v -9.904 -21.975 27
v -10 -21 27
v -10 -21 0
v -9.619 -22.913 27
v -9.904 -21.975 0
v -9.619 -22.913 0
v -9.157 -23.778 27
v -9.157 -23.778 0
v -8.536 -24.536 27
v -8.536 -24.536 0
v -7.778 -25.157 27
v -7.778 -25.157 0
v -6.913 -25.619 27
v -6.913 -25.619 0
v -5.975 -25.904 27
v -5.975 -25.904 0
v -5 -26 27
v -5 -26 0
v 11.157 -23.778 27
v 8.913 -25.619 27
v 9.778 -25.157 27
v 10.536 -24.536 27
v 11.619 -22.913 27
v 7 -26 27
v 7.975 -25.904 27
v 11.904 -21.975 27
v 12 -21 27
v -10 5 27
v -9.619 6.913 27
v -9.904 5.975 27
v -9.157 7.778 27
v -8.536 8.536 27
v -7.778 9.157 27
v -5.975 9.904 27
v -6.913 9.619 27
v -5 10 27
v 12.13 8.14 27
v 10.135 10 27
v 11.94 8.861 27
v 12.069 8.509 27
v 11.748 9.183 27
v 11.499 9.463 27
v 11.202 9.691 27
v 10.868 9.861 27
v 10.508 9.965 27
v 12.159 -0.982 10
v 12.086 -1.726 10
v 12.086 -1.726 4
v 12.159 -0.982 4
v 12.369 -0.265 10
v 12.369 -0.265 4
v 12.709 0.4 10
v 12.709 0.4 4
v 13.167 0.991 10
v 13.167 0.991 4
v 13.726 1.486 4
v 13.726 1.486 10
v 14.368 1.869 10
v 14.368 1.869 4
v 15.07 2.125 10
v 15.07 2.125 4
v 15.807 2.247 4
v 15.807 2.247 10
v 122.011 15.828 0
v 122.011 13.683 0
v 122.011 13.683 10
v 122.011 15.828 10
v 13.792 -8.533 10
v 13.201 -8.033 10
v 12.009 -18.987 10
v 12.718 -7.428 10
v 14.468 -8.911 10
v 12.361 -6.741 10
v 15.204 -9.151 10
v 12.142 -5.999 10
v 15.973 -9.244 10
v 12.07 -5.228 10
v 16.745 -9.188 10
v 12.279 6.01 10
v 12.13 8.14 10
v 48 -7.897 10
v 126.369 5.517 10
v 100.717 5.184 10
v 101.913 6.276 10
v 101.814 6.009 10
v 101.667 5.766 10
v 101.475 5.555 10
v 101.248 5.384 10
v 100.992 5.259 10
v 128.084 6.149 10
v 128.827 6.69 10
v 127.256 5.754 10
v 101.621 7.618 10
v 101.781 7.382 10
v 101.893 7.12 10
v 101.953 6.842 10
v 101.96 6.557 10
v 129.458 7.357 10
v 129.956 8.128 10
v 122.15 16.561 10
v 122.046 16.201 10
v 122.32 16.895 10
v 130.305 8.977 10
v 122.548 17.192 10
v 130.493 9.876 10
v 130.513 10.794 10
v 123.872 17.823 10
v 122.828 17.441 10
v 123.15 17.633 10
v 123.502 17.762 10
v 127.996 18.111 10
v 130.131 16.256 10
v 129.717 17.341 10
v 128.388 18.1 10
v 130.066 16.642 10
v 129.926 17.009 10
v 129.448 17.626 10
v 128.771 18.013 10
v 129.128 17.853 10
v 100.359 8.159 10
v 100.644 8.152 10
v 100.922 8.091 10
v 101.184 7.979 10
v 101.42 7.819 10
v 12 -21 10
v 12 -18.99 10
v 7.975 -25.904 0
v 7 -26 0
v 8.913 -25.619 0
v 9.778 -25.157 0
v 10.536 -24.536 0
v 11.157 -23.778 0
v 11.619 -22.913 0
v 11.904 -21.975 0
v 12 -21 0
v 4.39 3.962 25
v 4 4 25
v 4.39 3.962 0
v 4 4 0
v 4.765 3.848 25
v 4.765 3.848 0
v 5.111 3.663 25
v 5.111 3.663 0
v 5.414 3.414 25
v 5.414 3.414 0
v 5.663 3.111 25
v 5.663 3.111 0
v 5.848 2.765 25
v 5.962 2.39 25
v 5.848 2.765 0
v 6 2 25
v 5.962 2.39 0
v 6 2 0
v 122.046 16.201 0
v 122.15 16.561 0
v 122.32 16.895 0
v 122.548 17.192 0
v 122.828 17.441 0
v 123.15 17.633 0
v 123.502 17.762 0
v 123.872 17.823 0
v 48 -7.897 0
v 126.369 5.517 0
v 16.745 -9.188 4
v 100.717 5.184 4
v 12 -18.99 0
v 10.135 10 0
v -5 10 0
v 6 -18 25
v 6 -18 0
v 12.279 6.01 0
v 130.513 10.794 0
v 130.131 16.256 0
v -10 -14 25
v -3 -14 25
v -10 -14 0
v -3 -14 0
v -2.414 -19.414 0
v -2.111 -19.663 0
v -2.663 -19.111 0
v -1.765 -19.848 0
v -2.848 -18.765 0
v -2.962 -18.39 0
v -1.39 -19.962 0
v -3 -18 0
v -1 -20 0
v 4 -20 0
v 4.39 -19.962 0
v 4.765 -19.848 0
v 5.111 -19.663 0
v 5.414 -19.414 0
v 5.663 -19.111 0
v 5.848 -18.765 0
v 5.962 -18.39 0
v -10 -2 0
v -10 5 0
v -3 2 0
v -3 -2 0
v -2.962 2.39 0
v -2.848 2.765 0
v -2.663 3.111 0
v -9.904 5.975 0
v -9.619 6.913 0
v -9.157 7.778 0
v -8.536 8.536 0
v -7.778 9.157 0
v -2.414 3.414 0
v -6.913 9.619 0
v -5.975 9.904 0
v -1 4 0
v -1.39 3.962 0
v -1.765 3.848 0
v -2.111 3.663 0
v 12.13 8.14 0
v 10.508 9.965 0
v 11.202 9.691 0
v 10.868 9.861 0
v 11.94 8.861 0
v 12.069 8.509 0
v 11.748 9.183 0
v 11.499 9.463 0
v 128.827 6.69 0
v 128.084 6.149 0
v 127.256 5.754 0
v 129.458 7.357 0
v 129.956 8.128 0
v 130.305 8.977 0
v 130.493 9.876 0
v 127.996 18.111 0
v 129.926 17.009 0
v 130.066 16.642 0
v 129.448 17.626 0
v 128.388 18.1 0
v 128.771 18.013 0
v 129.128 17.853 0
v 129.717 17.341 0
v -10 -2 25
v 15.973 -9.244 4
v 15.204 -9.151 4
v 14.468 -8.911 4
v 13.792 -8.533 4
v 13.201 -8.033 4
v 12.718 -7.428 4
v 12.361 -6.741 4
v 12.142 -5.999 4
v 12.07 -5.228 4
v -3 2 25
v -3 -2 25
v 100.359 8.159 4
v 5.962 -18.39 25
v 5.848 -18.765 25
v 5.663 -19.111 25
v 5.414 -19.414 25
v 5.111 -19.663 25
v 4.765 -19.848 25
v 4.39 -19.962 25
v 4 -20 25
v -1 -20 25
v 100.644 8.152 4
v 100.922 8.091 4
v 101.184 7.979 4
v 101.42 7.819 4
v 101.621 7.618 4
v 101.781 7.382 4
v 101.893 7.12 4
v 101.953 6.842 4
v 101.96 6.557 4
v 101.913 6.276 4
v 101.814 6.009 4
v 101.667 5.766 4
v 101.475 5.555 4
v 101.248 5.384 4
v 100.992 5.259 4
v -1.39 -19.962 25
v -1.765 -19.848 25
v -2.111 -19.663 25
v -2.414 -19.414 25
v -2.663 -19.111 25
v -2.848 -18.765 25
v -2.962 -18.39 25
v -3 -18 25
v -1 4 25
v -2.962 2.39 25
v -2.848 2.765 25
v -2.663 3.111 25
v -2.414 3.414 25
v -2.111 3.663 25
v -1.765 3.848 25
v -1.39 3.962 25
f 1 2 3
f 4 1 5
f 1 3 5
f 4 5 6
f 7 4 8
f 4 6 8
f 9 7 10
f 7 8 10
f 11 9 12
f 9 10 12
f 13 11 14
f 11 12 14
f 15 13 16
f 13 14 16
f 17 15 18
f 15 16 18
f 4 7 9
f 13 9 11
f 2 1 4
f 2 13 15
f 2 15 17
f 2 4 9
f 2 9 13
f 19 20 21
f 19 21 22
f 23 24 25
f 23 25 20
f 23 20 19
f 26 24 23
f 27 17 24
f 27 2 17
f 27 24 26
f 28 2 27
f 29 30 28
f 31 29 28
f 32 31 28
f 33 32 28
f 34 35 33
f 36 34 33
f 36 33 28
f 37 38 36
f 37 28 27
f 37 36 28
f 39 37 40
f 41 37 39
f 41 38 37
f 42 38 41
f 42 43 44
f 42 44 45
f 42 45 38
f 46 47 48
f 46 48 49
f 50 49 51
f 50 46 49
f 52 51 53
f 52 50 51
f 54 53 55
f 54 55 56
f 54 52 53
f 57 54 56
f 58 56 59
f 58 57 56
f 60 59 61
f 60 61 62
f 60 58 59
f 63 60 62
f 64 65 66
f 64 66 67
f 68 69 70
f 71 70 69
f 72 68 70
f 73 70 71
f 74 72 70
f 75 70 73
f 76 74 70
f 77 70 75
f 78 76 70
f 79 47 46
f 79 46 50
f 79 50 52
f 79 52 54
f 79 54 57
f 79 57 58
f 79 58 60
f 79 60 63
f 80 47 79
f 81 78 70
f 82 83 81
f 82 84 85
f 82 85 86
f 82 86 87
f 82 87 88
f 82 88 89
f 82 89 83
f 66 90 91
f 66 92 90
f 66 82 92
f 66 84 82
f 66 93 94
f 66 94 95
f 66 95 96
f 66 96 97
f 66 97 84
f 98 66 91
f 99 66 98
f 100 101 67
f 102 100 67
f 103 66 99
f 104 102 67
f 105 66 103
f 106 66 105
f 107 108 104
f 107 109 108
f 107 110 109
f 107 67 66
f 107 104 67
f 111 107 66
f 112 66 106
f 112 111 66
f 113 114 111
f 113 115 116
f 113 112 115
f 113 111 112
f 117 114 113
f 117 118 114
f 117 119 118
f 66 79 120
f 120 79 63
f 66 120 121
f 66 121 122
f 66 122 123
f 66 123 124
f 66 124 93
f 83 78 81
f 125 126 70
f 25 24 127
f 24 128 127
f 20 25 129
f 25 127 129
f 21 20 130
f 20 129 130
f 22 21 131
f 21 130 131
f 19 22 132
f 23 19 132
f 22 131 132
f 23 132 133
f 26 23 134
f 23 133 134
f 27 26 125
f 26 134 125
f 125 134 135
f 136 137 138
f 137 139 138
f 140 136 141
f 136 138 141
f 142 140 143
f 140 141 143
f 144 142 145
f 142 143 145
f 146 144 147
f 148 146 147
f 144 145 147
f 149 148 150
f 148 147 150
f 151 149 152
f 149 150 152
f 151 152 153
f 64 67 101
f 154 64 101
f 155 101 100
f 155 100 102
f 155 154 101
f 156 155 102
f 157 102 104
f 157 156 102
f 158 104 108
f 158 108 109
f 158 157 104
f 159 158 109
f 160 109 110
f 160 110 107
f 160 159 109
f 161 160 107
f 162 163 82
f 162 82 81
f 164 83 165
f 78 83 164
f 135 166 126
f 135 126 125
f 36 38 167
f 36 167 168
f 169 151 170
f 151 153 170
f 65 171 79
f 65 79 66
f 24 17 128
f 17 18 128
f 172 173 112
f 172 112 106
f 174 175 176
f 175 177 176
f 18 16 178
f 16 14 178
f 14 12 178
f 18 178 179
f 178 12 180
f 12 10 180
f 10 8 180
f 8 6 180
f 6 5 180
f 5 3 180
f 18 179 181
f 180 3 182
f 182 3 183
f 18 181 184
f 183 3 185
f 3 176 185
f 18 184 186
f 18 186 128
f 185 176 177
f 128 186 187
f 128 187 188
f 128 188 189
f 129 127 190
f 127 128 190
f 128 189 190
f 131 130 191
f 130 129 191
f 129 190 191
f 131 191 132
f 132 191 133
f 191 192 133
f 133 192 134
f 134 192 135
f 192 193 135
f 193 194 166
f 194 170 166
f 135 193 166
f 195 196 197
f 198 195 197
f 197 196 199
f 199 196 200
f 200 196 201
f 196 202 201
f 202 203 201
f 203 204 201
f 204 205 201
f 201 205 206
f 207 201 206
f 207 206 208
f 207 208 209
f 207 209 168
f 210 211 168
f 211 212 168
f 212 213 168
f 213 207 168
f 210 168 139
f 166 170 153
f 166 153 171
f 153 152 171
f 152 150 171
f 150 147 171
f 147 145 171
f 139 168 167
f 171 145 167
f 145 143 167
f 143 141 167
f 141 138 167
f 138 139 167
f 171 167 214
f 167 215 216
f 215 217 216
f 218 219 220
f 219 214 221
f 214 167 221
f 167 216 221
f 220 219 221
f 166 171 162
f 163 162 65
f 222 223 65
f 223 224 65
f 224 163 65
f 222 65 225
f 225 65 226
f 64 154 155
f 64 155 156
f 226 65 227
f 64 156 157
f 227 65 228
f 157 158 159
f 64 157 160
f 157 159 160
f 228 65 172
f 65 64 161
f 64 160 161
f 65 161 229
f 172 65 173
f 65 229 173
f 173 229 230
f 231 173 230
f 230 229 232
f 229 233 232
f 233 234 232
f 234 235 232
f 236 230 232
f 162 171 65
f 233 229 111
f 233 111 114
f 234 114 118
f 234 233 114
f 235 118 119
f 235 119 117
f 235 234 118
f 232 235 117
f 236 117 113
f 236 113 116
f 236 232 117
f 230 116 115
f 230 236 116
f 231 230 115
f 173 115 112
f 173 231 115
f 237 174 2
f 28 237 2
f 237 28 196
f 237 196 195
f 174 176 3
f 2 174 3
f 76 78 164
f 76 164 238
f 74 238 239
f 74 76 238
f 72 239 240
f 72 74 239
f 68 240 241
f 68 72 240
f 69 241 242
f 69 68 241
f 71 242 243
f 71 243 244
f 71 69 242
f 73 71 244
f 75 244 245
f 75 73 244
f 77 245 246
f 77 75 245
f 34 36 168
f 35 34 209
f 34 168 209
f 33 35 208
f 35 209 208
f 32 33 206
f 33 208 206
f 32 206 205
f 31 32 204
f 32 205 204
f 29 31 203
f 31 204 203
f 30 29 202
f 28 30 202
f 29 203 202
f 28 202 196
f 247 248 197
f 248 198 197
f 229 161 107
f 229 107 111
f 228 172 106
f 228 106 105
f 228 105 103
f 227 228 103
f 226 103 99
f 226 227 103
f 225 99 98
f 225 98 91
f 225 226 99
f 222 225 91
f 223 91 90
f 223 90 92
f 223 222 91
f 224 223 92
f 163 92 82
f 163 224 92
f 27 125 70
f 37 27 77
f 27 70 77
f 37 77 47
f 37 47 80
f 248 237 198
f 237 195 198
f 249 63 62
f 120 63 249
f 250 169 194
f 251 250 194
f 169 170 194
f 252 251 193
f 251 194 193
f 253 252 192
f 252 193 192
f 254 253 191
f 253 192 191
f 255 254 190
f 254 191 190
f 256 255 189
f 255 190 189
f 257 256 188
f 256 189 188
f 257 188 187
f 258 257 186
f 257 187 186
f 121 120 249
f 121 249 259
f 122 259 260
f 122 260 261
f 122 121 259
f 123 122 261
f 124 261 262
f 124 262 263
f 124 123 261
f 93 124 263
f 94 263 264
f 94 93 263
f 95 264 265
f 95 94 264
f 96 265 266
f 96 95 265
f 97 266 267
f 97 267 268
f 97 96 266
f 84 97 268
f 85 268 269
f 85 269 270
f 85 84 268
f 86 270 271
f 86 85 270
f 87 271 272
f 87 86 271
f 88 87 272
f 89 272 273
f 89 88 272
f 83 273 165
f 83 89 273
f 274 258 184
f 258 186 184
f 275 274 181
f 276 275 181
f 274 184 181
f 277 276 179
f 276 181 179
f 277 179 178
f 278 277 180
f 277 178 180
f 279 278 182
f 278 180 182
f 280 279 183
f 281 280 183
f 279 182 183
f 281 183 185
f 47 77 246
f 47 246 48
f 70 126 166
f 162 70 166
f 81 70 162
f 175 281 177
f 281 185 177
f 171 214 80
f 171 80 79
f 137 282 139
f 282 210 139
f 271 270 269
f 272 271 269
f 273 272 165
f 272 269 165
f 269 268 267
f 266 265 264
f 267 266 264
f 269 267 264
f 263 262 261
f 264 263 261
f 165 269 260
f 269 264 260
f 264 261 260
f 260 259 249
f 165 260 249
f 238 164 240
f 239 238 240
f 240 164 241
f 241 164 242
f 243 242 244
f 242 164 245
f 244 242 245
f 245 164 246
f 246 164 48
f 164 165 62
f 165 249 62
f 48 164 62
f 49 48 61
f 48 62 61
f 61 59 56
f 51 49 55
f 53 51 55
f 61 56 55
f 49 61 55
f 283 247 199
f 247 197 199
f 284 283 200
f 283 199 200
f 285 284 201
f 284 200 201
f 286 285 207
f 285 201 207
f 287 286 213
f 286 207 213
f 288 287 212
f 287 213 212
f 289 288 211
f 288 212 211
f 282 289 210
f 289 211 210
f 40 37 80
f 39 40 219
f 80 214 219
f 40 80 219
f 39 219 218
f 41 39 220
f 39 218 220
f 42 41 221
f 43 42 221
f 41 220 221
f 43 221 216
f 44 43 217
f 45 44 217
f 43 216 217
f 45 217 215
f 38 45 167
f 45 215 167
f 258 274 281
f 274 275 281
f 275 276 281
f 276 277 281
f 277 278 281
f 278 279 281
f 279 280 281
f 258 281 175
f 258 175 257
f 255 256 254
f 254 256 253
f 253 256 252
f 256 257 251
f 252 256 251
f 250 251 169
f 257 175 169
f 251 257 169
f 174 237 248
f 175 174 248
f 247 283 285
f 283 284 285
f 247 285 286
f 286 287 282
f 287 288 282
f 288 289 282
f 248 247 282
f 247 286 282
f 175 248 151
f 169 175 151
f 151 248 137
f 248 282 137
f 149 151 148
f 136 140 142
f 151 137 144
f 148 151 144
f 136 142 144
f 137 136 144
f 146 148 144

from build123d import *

# Parameters (mm, degrees)
BOSS_EXTRUDE1_DEPTH = 10
BOSS_EXTRUDE2_DEPTH = 10
BOSS_EXTRUDE3_DEPTH = 15
BOSS_EXTRUDE4_DEPTH = 2
CUT_EXTRUDE1_DEPTH  = 6


with BuildPart() as part:
    # Sketch1 → Boss-Extrude1 (new body)
    with BuildSketch(Plane.XY):
        with BuildLine():
            Line((-5, 10), (10.134969828, 10))
            ThreePointArc((10.134969828, 10), (11.498966548, 9.462707403), (12.130097928, 8.139512947))
            Line((12.130097928, 8.139512947), (12.279025895, 6.009743799))
            Line((12.279025895, 6.009743799), (122.011071424, 13.682955911))
            Line((122.011071424, 13.682955911), (122.011071424, 15.827693331))
            ThreePointArc((122.011071424, 15.827693331), (122.54836402, 17.191690051), (123.871558476, 17.822821431))
            Line((123.871558476, 17.822821431), (127.996455725, 18.111262346))
            ThreePointArc((127.996455725, 18.111262346), (129.448086731, 17.625553406), (130.131096773, 16.255647193))
            Line((130.131096773, 16.255647193), (130.513028814, 10.79376454))
            ThreePointArc((130.513028814, 10.79376454), (129.45752894, 7.356802052), (126.3687377, 5.516649939))
            Line((126.3687377, 5.516649939), (12, -14.058605554))
            Line((12, -14.058605554), (12, -21))
            ThreePointArc((12, -21), (10.535533906, -24.535533906), (7, -26))
            Line((7, -26), (-5, -26))
            ThreePointArc((-5, -26), (-8.535533906, -24.535533906), (-10, -21))
            Line((-10, -21), (-10, -14))
            Line((-10, -14), (-3, -14))
            Line((-3, -14), (-3, -18))
            ThreePointArc((-3, -18), (-2.414213562, -19.414213562), (-1, -20))
            Line((-1, -20), (4, -20))
            ThreePointArc((4, -20), (5.414213562, -19.414213562), (6, -18))
            Line((6, -18), (6, 2))
            ThreePointArc((6, 2), (5.414213562, 3.414213562), (4, 4))
            Line((4, 4), (-1, 4))
            ThreePointArc((-1, 4), (-2.414213562, 3.414213562), (-3, 2))
            Line((-3, 2), (-3, -2))
            Line((-3, -2), (-10, -2))
            Line((-10, -2), (-10, 5))
            ThreePointArc((-10, 5), (-8.535533906, 8.535533906), (-5, 10))
        make_face()
    extrude(amount=BOSS_EXTRUDE1_DEPTH)

    # Sketch4 → Boss-Extrude2 (add)
    with BuildSketch(Plane.XY.offset(10)):
        Polygon((12, -18.990256201), (48, -7.896876292), (12, -14.058605554), align=None)
    extrude(amount=-BOSS_EXTRUDE2_DEPTH)

    # Sketch5 → Boss-Extrude3 (add)
    with BuildSketch(Plane.XY.offset(10)):
        with BuildLine():
            Line((12, -21), (12.130097928, 8.139512947))
            ThreePointArc((12.130097928, 8.139512947), (11.498966548, 9.462707403), (10.134969828, 10))
            Line((10.134969828, 10), (-5, 10))
            ThreePointArc((-5, 10), (-8.535533906, 8.535533906), (-10, 5))
            Line((-10, 5), (-10, -2))
            Line((-10, -2), (-3, -2))
            Line((-3, -2), (-3, 2))
            ThreePointArc((-3, 2), (-2.414213562, 3.414213562), (-1, 4))
            Line((-1, 4), (4, 4))
            ThreePointArc((4, 4), (5.414213562, 3.414213562), (6, 2))
            Line((6, 2), (6, -18))
            ThreePointArc((6, -18), (5.414213562, -19.414213562), (4, -20))
            Line((4, -20), (-1, -20))
            ThreePointArc((-1, -20), (-2.414213562, -19.414213562), (-3, -18))
            Line((-3, -18), (-3, -14))
            Line((-3, -14), (-10, -14))
            Line((-10, -14), (-10, -21))
            ThreePointArc((-10, -21), (-8.535533906, -24.535533906), (-5, -26))
            Line((-5, -26), (7, -26))
            ThreePointArc((7, -26), (10.535533906, -24.535533906), (12, -21))
        make_face()
    extrude(amount=BOSS_EXTRUDE3_DEPTH)

    # Sketch6 → Boss-Extrude4 (add)
    with BuildSketch(Plane.XY.offset(25)):
        with BuildLine():
            Line((-10, 5), (-10, -21))
            ThreePointArc((-10, -21), (-8.535533906, -24.535533906), (-5, -26))
            Line((-5, -26), (7, -26))
            ThreePointArc((7, -26), (10.535533906, -24.535533906), (12, -21))
            Line((12, -21), (12.130097928, 8.139512947))
            ThreePointArc((12.130097928, 8.139512947), (11.498966548, 9.462707403), (10.134969828, 10))
            Line((10.134969828, 10), (-5, 10))
            ThreePointArc((-5, 10), (-8.535533906, 8.535533906), (-10, 5))
        make_face()
    extrude(amount=BOSS_EXTRUDE4_DEPTH)

    # Sketch2 → Cut-Extrude1 (cut)
    with BuildSketch(Plane.XY.offset(10)):
        with BuildLine():
            Line((12.07041778, -5.227728761), (12.086053037, -1.725722453))
            ThreePointArc((12.086053037, -1.725722453), (13.166695385, 0.990936179), (15.806987276, 2.246675299))
            Line((15.806987276, 2.246675299), (100.359457674, 8.159159996))
            ThreePointArc((100.359457674, 8.159159996), (101.953365437, 6.84188311), (100.717151126, 5.18431425))
            Line((100.717151126, 5.18431425), (16.745201224, -9.188252997))
            ThreePointArc((16.745201224, -9.188252997), (13.484730649, -8.29754203), (12.07041778, -5.227728761))
        make_face()
    extrude(amount=-CUT_EXTRUDE1_DEPTH, mode=Mode.SUBTRACT)


solid = part.part
